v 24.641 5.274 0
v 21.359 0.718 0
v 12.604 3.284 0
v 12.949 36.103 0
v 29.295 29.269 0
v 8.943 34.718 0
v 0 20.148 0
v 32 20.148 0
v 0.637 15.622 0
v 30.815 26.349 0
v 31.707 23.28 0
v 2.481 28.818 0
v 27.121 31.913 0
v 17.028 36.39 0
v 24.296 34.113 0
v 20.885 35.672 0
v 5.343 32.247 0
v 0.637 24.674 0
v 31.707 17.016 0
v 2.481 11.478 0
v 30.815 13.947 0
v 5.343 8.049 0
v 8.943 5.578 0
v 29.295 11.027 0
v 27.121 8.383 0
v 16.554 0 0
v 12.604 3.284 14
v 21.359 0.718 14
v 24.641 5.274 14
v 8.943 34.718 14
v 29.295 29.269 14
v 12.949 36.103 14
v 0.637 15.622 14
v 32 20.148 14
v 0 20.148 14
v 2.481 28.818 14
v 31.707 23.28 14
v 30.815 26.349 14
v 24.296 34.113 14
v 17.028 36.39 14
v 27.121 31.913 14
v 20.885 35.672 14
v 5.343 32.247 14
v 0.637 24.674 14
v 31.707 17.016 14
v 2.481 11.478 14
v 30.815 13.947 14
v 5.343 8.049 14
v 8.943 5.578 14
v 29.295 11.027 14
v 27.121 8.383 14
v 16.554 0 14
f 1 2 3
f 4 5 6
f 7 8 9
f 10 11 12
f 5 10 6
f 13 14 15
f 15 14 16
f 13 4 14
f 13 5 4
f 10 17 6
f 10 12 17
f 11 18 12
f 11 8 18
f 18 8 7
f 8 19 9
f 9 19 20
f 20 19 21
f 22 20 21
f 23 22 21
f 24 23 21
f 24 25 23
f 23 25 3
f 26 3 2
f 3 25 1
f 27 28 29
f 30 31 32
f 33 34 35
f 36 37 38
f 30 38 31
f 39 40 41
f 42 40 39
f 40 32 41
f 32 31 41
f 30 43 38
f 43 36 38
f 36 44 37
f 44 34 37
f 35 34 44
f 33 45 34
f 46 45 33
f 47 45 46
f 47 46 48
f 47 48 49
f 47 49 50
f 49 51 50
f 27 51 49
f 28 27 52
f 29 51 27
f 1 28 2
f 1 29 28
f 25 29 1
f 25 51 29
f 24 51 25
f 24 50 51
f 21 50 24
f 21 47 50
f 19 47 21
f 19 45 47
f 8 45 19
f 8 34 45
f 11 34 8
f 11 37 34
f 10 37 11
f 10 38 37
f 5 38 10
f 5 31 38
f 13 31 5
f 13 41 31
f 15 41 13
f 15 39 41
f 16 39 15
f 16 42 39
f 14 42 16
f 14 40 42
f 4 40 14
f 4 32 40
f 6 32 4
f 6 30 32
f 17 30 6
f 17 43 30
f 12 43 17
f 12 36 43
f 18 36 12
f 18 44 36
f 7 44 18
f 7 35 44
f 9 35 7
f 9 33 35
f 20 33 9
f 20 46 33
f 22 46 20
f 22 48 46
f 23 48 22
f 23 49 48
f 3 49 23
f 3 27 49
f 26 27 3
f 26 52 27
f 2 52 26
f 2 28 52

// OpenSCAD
$fn = 32;

// ----------------------------------------------------------------------
// Cam disc: base radius 13.0 mm, lift 6.0 mm, 26 profile points
// ----------------------------------------------------------------------

// --- parameters (mm) ---
profile_height = 14;      // extrusion height
profile_points = 26;      // points of the closed outline

profile = [[32, 20.148], [31.707, 23.28], [30.815, 26.349], [29.295, 29.269], [27.121, 31.913], [24.296, 34.113], [20.885, 35.672], [17.028, 36.39], [12.949, 36.103], [8.943, 34.718], [5.343, 32.247], [2.481, 28.818], [0.637, 24.674], [0, 20.148], [0.637, 15.622], [2.481, 11.478], [5.343, 8.049], [8.943, 5.578], [12.604, 3.284], [16.554, 0], [21.359, 0.718], [24.641, 5.274], [27.121, 8.383], [29.295, 11.027], [30.815, 13.947], [31.707, 17.016]];  // single closed polygon, 26 points, counter clockwise

// --- the one profile operation ---
linear_extrude(height = profile_height) polygon(points = profile);
